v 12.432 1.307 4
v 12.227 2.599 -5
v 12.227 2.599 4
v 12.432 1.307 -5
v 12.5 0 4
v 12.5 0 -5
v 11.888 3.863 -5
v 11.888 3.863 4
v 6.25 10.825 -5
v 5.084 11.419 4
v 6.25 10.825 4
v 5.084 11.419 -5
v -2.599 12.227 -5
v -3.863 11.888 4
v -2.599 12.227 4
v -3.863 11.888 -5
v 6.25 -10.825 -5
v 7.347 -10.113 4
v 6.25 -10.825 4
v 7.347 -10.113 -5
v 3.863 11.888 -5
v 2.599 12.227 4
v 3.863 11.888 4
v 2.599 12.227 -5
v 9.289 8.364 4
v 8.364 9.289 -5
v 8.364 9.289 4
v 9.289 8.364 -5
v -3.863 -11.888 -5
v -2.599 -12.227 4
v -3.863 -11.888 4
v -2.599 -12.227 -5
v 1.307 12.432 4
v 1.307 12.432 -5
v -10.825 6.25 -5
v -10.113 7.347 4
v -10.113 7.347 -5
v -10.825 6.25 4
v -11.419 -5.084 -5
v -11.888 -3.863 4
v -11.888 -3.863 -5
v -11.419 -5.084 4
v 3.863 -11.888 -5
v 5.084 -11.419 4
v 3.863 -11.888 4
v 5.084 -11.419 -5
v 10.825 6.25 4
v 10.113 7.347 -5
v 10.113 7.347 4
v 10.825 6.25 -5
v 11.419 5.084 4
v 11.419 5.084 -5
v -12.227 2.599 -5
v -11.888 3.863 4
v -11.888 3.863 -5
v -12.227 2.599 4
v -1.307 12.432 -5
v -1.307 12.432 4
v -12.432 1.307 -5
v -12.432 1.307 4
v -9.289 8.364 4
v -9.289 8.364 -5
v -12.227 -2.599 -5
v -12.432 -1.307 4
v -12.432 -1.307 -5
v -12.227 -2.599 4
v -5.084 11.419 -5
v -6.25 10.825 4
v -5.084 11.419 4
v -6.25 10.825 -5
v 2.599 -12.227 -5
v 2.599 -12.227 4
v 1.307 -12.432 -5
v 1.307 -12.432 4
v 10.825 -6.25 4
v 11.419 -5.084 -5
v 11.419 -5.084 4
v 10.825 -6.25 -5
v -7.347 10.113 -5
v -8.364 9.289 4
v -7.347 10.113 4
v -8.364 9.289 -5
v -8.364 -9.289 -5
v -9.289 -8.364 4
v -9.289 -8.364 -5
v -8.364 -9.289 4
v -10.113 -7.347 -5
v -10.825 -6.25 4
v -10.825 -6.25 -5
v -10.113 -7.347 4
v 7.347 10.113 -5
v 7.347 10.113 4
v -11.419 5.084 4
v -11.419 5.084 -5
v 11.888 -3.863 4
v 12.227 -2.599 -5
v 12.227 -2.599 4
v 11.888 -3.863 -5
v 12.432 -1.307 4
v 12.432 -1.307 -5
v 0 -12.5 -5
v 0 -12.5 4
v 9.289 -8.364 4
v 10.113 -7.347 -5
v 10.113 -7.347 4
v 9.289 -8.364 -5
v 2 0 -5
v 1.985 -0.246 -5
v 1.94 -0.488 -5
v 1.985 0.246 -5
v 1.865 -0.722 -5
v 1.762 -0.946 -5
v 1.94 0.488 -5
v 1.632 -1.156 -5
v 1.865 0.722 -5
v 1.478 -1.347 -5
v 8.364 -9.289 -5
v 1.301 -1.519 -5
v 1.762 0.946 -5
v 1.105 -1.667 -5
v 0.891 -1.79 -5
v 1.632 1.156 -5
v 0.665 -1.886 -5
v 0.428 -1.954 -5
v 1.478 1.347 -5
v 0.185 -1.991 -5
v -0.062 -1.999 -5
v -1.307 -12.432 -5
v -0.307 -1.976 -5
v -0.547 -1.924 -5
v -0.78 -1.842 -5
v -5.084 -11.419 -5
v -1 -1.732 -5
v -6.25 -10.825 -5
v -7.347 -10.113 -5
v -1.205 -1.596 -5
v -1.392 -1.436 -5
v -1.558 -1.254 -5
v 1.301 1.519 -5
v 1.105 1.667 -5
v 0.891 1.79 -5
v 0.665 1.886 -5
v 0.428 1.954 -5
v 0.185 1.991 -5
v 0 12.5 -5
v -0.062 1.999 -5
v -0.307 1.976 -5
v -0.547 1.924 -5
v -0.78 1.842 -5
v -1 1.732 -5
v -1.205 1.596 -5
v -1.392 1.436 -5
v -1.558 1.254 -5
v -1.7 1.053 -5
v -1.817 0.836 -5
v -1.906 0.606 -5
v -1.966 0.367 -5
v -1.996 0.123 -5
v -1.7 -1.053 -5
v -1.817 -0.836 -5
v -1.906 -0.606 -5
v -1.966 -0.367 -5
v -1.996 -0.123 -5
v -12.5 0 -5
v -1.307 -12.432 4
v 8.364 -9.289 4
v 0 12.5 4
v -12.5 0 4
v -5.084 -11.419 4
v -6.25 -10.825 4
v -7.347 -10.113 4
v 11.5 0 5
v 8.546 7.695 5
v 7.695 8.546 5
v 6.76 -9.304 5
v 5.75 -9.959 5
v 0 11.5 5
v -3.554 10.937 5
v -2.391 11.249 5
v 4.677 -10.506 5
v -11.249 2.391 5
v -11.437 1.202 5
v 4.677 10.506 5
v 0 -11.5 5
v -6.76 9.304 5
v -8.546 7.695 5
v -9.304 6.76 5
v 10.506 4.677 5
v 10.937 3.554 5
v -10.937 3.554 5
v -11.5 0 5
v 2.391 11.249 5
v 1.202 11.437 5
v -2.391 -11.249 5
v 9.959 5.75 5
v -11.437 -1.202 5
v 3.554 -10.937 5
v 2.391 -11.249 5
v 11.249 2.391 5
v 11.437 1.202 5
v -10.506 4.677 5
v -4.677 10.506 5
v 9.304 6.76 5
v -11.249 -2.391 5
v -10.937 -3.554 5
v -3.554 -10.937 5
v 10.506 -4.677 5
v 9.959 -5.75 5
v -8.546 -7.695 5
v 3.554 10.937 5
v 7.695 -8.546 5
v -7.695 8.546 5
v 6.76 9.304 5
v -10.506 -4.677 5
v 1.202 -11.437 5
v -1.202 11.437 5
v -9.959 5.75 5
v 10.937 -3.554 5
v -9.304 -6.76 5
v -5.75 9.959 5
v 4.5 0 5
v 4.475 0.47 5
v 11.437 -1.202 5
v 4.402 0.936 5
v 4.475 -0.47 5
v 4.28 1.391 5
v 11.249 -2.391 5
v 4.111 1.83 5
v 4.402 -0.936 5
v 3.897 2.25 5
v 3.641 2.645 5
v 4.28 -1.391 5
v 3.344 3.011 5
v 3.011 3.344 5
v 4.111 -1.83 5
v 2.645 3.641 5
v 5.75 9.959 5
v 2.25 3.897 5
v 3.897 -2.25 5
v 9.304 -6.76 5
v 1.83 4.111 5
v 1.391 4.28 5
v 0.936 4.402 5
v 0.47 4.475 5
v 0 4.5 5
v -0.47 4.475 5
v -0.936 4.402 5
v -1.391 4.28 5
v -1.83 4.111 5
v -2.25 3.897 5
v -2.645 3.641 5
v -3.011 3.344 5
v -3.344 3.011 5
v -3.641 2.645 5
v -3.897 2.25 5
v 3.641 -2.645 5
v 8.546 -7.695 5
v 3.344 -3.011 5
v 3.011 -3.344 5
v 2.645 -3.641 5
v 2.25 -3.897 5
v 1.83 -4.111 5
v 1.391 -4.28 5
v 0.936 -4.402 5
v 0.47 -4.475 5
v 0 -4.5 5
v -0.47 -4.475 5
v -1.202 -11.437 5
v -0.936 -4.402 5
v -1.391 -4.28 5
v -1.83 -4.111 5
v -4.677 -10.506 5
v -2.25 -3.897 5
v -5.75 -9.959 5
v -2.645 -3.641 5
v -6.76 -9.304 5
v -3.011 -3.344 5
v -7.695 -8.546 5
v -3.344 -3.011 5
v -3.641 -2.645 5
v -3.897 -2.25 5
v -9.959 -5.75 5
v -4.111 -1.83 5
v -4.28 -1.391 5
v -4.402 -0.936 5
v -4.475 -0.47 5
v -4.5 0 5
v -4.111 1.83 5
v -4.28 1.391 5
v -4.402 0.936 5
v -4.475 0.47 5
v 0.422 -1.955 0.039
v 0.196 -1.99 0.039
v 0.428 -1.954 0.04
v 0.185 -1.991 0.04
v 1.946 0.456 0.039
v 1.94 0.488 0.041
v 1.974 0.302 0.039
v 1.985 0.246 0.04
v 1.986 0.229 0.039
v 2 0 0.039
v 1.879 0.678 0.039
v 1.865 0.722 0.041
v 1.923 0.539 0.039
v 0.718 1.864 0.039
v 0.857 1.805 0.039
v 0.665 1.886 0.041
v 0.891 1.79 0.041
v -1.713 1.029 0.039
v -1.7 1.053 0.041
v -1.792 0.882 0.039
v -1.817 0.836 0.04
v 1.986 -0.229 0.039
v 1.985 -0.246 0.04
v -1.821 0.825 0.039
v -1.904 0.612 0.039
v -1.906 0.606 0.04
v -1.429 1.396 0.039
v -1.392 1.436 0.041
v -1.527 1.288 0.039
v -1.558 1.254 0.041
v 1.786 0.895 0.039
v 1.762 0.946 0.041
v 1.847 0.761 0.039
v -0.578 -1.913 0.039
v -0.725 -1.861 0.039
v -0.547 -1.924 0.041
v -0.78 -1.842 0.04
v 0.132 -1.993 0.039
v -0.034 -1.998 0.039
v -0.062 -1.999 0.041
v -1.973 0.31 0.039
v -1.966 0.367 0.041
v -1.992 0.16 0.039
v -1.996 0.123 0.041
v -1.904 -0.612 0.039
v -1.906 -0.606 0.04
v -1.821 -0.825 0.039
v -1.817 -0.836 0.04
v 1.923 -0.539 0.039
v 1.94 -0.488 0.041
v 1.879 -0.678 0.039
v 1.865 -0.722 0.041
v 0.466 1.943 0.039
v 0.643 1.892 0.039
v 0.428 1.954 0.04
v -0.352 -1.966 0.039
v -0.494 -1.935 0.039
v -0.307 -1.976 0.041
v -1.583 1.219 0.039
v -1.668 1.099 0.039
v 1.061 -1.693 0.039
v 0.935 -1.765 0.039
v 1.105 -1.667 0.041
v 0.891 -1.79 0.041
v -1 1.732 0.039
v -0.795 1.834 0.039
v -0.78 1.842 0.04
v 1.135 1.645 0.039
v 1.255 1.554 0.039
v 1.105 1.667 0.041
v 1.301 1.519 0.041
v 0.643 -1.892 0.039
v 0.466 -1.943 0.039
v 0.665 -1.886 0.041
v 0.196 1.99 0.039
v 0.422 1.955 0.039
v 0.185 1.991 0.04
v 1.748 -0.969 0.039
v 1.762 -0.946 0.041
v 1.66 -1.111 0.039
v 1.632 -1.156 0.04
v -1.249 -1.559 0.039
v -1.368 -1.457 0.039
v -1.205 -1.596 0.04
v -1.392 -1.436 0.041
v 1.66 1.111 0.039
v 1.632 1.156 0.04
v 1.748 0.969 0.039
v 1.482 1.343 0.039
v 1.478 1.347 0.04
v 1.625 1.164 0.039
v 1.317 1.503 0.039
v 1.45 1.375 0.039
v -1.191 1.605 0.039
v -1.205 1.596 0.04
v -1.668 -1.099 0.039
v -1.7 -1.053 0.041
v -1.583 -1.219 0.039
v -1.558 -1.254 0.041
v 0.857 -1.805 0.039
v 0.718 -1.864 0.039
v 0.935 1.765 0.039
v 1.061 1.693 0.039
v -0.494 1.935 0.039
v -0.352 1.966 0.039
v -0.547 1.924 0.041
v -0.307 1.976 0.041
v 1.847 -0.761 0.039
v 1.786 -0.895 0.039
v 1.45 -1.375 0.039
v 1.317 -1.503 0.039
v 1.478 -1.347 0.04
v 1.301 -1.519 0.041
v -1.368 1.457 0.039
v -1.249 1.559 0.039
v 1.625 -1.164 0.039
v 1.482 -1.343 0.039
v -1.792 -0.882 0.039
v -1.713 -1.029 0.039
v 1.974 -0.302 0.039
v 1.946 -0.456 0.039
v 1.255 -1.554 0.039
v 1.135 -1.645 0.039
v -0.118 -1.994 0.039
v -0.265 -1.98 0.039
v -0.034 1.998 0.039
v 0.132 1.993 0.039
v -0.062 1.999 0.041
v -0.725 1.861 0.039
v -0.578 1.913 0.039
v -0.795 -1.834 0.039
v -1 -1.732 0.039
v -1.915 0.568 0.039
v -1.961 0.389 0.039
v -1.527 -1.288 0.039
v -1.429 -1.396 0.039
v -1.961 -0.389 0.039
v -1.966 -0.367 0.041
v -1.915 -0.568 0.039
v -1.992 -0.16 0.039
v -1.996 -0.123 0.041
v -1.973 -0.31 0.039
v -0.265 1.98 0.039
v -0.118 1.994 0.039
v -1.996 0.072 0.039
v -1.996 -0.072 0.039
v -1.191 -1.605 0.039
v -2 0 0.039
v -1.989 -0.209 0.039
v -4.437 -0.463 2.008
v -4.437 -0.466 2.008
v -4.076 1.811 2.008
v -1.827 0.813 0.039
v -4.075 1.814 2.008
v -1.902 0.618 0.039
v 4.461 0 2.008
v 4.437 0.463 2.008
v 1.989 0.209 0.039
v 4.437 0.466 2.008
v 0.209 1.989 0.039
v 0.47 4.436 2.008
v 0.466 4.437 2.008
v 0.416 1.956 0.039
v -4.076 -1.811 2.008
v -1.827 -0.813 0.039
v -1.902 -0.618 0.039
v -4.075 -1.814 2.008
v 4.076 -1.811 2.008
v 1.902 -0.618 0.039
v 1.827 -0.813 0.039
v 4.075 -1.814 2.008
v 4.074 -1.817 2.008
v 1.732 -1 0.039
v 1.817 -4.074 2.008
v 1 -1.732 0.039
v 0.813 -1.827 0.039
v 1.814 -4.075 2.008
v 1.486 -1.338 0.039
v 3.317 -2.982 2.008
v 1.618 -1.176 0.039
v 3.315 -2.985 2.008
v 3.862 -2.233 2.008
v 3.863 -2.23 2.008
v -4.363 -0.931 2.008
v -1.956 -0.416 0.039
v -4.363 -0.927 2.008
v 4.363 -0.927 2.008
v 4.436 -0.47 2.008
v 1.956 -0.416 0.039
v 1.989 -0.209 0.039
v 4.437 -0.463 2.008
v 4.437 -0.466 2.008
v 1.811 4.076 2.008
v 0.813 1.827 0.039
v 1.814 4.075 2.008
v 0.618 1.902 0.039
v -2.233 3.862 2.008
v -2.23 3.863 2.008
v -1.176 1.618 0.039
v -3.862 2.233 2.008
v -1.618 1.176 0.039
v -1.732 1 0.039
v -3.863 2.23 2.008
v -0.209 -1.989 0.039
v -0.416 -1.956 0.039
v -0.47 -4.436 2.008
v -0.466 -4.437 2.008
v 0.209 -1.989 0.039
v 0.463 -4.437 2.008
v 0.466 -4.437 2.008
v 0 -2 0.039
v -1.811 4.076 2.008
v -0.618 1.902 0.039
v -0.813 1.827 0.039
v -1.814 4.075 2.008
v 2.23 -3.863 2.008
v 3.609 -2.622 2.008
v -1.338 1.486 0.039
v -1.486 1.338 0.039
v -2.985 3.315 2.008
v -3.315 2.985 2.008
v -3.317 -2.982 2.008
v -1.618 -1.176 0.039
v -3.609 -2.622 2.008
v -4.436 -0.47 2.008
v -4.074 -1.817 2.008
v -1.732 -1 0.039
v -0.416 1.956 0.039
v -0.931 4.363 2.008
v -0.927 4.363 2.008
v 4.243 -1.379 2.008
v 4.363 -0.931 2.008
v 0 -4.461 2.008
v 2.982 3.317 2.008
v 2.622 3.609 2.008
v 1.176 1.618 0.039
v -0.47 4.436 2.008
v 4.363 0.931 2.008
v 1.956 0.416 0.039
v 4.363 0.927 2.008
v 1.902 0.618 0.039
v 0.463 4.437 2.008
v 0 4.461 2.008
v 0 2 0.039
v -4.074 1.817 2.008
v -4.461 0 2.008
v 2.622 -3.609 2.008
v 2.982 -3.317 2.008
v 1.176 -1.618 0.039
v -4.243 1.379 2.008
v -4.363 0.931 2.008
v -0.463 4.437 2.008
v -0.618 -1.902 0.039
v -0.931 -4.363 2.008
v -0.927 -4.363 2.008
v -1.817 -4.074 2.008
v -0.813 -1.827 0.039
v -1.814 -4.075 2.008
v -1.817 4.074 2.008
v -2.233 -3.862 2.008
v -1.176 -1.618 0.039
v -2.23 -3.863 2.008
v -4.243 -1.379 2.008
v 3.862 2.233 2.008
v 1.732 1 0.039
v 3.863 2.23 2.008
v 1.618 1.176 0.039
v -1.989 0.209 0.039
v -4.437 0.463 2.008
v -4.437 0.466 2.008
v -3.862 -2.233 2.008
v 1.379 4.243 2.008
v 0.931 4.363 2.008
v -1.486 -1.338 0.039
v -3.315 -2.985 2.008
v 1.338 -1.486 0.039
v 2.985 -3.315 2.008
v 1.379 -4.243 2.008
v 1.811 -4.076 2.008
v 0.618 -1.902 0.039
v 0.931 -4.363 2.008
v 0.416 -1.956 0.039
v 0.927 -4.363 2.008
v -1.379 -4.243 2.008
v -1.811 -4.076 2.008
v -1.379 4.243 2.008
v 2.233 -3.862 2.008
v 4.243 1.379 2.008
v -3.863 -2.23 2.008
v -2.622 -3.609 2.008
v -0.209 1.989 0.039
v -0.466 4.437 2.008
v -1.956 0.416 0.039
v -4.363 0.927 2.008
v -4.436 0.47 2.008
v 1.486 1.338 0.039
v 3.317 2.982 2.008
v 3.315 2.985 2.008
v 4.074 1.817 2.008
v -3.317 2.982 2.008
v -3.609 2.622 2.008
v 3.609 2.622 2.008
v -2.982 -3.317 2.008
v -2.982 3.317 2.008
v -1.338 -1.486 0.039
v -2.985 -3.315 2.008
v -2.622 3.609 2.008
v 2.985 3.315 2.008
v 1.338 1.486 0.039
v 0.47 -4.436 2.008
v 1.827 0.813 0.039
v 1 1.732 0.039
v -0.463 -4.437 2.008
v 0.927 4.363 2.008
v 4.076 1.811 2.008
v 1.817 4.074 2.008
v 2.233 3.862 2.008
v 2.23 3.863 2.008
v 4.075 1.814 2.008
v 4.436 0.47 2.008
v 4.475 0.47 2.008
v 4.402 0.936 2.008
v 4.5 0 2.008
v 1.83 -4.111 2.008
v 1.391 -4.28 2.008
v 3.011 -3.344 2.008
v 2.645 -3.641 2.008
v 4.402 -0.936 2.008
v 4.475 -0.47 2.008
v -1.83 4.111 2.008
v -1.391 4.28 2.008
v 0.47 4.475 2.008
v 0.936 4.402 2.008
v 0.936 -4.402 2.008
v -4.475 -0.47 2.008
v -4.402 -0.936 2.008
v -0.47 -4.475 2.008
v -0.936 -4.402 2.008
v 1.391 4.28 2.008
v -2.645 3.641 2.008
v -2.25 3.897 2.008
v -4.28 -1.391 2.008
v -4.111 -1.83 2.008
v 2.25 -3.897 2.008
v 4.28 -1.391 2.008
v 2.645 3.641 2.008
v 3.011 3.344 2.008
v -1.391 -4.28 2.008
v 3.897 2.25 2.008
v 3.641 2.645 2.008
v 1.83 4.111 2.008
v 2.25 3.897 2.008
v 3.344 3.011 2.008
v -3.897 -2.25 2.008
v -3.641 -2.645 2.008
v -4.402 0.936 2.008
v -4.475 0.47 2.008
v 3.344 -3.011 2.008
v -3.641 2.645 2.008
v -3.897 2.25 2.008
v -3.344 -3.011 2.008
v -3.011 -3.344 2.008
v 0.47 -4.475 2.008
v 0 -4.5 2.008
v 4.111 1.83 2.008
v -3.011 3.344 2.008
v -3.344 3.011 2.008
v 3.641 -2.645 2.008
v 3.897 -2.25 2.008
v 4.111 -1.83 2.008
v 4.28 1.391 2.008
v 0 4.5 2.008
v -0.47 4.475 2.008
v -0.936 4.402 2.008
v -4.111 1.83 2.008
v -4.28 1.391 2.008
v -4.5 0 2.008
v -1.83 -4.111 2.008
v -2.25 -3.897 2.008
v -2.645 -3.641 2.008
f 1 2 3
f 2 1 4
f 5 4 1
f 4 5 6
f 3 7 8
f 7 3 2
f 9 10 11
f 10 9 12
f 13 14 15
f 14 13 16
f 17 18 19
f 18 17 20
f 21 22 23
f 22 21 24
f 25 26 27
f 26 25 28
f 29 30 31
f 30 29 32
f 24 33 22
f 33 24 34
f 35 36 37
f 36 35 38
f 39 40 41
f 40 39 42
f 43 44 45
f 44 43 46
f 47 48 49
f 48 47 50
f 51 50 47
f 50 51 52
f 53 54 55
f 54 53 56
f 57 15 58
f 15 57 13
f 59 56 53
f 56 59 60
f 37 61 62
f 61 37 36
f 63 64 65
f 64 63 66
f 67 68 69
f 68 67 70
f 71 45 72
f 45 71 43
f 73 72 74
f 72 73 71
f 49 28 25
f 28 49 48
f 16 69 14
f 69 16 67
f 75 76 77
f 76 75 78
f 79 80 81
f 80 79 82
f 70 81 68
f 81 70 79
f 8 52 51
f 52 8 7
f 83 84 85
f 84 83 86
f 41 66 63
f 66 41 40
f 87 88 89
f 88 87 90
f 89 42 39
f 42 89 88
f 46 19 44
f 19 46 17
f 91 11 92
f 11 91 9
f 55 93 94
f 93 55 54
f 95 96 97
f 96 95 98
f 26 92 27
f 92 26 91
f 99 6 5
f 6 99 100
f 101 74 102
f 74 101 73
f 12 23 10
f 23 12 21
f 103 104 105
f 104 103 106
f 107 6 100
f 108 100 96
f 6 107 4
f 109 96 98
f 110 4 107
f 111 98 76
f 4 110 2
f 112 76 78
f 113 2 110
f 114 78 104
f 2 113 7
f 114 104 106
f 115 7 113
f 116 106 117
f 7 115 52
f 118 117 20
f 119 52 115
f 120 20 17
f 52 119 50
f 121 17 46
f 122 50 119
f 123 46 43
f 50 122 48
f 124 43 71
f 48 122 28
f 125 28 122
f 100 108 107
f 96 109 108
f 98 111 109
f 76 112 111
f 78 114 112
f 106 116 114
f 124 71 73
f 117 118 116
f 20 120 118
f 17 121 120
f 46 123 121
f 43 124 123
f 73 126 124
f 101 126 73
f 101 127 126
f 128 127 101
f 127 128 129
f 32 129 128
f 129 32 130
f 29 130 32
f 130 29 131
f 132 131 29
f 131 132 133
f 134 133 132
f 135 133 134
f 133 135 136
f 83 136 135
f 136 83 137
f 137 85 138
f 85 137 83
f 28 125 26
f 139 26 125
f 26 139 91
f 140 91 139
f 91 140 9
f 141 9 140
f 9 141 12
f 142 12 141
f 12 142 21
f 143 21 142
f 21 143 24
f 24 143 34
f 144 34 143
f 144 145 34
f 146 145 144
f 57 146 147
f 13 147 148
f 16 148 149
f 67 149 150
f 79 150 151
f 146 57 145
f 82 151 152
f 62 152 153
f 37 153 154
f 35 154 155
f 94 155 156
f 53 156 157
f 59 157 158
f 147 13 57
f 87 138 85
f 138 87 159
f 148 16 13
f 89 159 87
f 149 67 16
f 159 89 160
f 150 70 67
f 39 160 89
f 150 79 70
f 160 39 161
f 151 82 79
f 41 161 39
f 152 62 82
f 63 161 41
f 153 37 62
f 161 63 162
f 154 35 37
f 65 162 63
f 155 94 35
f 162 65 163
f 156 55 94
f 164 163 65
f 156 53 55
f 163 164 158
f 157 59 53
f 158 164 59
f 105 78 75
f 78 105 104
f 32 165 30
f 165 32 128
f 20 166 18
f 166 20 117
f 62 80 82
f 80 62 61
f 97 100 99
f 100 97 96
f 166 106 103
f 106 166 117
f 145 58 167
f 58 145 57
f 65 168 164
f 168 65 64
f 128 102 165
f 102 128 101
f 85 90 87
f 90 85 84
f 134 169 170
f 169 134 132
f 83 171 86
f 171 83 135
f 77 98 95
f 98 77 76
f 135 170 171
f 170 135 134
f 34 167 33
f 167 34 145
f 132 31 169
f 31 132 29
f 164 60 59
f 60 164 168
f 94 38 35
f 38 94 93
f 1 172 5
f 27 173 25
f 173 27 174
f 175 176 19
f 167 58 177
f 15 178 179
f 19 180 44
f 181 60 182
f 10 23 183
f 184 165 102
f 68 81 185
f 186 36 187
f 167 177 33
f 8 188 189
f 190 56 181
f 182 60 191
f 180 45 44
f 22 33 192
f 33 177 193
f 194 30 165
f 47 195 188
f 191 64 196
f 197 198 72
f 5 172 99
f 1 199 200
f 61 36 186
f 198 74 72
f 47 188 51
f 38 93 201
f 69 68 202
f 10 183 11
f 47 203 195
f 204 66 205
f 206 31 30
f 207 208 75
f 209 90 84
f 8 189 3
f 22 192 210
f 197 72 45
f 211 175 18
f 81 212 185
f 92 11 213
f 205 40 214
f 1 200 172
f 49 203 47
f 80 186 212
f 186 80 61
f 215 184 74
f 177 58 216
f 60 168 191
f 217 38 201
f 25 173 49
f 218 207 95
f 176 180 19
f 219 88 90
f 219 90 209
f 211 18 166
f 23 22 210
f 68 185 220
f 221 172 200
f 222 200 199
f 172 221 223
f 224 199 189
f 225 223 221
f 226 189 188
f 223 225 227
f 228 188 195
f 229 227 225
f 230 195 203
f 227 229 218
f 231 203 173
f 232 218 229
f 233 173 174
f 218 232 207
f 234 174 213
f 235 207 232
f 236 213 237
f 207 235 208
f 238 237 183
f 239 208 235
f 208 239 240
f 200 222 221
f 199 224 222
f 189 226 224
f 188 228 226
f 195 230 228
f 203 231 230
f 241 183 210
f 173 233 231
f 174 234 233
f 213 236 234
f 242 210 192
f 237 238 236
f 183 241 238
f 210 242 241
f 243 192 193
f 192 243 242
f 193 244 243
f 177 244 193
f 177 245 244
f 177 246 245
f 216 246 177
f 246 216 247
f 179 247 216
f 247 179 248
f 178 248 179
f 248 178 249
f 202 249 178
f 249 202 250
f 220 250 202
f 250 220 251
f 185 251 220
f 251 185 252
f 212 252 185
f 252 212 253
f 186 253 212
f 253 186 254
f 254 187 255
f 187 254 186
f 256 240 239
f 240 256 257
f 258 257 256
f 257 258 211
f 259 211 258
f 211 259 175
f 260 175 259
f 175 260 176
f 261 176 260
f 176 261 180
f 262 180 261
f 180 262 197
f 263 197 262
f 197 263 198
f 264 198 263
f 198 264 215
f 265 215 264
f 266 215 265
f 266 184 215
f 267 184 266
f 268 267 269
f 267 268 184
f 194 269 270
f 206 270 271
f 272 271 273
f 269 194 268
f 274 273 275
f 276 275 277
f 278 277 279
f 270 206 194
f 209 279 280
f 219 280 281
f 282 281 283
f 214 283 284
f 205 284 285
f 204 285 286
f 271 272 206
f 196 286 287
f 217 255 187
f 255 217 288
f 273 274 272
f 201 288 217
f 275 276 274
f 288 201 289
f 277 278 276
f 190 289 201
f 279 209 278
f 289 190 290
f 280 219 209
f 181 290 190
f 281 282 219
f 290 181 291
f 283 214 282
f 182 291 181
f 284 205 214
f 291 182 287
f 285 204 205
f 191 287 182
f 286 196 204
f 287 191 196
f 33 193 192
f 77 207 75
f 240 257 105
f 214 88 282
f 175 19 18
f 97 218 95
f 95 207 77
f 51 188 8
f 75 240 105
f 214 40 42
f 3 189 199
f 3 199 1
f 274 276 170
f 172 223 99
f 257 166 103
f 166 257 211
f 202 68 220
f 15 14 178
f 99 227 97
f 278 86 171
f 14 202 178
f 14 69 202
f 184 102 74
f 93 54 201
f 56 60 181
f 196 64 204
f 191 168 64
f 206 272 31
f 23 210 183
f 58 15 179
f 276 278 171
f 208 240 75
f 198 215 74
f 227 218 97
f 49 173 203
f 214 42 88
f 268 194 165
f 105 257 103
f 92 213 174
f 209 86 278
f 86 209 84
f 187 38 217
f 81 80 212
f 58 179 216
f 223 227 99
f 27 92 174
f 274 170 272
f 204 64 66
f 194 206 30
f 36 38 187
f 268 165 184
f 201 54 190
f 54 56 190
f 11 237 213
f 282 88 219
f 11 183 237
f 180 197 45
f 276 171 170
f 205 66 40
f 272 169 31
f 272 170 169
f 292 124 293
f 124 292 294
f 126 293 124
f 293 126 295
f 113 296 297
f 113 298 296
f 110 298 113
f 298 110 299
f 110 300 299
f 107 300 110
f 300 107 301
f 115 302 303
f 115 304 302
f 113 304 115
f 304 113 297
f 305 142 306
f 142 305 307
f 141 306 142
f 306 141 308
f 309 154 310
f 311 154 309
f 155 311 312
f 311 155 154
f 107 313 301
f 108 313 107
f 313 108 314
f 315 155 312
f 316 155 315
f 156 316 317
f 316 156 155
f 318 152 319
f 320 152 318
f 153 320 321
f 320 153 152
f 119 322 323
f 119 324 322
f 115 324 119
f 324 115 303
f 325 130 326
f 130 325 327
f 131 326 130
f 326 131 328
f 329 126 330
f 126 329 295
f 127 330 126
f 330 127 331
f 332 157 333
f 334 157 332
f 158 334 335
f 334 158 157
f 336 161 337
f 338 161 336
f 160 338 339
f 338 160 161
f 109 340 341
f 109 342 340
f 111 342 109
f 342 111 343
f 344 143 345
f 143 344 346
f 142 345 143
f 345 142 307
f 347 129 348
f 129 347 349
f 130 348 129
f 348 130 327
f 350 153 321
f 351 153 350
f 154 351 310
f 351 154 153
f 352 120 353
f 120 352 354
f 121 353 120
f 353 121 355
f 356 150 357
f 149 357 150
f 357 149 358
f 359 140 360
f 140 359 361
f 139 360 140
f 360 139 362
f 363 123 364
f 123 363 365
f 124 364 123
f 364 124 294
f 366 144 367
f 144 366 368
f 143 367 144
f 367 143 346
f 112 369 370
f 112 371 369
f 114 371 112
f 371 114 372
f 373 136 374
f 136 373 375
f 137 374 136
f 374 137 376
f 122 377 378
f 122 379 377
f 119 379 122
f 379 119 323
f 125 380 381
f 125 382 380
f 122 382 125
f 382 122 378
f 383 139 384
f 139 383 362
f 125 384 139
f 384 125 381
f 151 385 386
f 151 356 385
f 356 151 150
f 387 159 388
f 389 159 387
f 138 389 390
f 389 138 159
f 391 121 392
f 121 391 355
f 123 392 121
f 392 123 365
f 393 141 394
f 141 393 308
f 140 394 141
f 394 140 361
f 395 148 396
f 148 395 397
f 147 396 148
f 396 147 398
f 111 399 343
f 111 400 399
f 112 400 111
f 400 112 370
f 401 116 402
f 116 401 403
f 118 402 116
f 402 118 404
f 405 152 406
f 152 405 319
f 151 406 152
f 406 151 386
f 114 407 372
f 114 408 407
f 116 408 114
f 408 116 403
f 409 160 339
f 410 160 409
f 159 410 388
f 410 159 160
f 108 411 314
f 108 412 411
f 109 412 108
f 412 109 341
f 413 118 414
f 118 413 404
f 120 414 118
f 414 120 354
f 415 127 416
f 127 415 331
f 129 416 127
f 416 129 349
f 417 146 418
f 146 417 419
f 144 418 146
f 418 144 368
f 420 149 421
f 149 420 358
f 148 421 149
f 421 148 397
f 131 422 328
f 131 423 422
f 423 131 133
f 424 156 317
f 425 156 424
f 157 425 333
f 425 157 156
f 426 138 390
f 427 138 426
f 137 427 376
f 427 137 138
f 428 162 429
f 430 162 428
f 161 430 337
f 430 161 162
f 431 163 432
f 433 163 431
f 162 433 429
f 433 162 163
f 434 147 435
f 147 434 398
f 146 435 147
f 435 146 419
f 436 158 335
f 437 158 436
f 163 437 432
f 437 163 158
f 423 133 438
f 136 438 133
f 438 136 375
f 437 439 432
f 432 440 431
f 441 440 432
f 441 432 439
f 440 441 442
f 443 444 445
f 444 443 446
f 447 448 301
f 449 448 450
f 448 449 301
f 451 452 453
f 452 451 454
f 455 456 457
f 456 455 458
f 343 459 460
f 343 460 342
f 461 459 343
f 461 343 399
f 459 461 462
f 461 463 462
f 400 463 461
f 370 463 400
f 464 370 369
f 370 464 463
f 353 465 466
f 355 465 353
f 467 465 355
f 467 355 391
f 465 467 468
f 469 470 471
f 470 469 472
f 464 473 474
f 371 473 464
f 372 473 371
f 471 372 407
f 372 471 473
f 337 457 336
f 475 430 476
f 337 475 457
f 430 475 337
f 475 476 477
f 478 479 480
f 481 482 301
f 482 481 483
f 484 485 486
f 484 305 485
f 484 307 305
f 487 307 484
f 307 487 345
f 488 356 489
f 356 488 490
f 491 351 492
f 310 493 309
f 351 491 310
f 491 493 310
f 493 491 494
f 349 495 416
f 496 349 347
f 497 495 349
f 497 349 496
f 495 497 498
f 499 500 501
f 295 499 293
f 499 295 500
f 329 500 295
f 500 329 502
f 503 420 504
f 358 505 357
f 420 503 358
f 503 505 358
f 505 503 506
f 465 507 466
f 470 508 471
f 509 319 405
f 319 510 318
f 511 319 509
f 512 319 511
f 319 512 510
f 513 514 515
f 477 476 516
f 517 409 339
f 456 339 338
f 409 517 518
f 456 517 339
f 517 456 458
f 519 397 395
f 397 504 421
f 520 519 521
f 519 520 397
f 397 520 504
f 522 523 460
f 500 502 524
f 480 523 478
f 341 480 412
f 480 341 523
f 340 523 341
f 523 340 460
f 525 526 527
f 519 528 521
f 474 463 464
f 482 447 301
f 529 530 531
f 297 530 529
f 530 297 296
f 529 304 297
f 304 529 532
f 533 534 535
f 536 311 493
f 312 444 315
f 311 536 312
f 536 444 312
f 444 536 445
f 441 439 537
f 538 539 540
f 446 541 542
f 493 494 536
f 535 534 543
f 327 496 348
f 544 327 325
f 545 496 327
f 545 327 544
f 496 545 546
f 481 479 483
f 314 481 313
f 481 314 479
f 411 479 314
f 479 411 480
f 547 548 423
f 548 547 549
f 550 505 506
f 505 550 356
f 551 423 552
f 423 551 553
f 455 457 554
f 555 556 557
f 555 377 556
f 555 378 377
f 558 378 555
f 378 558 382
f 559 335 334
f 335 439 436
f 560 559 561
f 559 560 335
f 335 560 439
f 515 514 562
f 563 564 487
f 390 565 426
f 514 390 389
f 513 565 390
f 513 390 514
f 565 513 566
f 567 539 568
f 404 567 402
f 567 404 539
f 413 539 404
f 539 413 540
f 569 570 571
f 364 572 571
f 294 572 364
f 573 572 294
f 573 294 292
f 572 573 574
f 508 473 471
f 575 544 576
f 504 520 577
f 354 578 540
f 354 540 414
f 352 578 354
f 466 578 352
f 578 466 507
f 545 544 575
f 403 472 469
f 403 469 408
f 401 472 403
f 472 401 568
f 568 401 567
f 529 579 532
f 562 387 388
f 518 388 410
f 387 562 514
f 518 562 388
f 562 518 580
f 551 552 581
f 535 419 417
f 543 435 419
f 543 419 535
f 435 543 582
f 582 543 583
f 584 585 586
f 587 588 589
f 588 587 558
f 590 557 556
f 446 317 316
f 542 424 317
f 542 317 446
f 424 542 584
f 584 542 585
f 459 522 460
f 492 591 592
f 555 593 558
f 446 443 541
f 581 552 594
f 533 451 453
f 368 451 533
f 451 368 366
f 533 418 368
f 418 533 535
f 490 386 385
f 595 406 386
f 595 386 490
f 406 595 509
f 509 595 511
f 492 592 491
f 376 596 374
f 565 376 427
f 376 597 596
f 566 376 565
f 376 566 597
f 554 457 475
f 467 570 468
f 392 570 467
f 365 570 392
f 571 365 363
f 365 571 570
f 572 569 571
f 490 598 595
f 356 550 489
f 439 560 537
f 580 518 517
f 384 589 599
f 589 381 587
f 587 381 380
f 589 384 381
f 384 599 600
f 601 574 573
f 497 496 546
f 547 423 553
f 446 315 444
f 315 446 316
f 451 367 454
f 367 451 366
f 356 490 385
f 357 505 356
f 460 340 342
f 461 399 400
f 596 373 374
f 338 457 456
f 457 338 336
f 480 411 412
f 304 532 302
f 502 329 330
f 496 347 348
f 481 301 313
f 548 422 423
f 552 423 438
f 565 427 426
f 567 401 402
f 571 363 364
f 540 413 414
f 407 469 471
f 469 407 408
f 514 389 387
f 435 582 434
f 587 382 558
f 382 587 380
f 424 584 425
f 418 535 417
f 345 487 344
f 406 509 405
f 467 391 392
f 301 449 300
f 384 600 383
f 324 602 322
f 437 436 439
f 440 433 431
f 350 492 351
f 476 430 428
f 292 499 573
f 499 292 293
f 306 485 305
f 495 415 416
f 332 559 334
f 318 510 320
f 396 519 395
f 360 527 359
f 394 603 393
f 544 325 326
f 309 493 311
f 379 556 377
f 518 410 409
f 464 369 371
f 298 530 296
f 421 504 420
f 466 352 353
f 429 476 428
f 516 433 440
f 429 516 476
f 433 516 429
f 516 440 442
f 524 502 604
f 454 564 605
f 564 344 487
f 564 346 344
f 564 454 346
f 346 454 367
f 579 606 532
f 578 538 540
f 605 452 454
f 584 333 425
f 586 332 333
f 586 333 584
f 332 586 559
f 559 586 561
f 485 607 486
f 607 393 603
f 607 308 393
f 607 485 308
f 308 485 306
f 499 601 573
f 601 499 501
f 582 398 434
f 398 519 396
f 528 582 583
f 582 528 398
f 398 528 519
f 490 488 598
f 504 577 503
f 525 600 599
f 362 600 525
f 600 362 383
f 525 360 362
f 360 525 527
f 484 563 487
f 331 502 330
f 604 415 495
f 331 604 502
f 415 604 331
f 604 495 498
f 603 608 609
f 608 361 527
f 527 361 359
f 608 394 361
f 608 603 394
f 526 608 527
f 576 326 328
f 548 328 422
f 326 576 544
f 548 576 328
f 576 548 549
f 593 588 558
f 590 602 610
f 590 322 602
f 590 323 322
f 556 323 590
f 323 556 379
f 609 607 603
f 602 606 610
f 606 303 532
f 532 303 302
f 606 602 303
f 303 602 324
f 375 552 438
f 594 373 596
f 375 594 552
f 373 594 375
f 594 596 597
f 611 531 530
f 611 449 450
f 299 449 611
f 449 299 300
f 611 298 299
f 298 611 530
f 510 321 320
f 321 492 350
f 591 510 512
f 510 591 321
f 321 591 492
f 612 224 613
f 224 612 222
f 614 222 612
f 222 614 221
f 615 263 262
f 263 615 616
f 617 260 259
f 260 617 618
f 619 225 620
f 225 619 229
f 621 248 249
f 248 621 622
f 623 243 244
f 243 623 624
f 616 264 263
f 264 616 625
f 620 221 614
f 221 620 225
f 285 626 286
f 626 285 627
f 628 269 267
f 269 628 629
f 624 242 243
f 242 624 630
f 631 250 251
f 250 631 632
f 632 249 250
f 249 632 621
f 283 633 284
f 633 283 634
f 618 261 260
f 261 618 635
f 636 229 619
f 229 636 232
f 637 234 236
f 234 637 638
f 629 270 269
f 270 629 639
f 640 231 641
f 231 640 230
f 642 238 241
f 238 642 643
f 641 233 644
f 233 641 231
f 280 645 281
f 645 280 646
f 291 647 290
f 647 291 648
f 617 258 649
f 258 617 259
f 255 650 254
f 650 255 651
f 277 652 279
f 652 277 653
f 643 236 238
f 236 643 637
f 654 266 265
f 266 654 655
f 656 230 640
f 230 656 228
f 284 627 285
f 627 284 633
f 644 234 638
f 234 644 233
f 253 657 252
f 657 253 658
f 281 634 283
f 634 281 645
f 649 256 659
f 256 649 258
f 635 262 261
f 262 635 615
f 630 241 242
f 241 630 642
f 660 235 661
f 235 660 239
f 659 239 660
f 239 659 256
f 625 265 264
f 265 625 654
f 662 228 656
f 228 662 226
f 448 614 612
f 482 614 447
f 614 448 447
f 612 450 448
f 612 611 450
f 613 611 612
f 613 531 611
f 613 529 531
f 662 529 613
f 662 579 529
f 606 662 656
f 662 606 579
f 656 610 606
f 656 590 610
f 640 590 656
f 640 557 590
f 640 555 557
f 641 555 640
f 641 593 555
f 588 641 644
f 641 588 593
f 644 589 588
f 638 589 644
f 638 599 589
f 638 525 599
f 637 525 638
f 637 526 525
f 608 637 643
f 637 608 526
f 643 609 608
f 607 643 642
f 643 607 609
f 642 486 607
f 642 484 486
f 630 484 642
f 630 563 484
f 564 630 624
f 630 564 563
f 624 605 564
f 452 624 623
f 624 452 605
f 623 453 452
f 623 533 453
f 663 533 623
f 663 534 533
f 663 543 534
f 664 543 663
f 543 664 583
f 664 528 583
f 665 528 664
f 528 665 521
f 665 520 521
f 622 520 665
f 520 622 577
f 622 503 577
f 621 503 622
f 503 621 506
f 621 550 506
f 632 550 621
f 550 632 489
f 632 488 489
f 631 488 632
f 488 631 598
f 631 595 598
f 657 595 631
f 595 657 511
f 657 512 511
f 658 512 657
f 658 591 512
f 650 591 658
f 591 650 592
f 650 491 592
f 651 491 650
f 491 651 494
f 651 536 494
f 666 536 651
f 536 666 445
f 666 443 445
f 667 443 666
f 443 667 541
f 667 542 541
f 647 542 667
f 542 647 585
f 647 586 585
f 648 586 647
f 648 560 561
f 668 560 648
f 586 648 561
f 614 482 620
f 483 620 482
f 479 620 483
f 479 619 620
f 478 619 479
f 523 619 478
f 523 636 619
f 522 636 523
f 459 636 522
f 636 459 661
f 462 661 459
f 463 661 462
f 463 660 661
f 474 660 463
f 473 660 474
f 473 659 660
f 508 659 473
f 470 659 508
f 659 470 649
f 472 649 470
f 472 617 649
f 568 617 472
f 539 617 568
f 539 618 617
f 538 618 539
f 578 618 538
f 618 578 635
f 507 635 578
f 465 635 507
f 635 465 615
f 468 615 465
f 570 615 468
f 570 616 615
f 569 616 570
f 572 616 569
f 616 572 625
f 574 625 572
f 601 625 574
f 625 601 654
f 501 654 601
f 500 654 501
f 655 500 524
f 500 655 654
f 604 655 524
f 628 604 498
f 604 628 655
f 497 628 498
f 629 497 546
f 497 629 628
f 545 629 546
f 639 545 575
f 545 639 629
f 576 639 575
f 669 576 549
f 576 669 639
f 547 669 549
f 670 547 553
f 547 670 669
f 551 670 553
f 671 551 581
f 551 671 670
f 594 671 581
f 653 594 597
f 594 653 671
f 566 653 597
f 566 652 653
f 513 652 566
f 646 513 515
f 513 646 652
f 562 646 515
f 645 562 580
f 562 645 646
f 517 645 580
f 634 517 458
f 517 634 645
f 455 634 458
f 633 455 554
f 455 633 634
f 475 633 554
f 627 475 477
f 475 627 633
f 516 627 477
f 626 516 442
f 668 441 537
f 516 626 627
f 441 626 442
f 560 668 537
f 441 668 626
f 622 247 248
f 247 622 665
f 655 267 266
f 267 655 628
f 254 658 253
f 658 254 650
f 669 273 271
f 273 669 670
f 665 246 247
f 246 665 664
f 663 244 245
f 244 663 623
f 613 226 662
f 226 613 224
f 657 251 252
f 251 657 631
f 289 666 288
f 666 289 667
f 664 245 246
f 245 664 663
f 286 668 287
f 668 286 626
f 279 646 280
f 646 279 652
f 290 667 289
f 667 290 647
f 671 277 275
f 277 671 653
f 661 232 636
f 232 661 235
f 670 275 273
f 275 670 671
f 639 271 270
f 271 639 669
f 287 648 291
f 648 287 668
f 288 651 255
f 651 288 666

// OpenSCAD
// file: ../../globals.scad
//$fa = $preview? 12 : 6;
//$fs = $preview? 2 : 0.2;

EPS = 1/64;

// Used for indexing coordinates since the dot syntax is not
// officialy supported
X = 0;
Y = 1;
Z = 2;

// Slicer defaults
LAYER_HEIGHT = 0.2;
EXTRUSION_WIDTH = 0.5;

// Defaults for all parts
WALL_XS = 1;
WALL_S = 2;
WALL = 3;
WALL_L = 5;
WALL_XL = 7.5;

// Seems to be a good middle ground, corresponds to #8 for imperial ones
SCREW = 4;

// Set up OpenSCAD rendering defaults
$fa = 6;
$fs = EXTRUSION_WIDTH / 2;

function default(v, d) = is_undef(v)? d : v;

// For engraving in all planes except those parrallel to XY.
module v_engrave(t, size=10) {
    translate([0, 0.3, 0])
    rotate([90,0,0])
    linear_extrude(0.3 + EPS)
    text(t, size=size, font="DejaVu Sans:style=Book", valign="center", halign="center", $fn=8);
}

// For engraving in all planes parrallel to XY.
module h_engrave(t, size=10) {
    translate([0, 0, -0.7])
    linear_extrude(0.7 + EPS)
    text(t, size=size, font="DejaVu Sans:style=Book", valign="center", halign="center", $fn=8);
}

// Used for creating screw holes
module screw(height, head_extra_height=0) {
    translate([0,0, -(height + head_extra_height) / 2]) {
        cylinder(height + 2*EPS, r=SCREW/2);
        
        // Add some extra radius to account for hole shrinkage
        translate([0,0,height-SCREW/2 + 2*EPS])
        cylinder(SCREW/2, r1=SCREW/2, r2=SCREW + 0.5);
        
        translate([0,0,height])
        cylinder(head_extra_height + EPS, r=SCREW + 0.5);
    }
}
// main file
include <../../globals.scad>;
use <../../dim.scad>;

//D: Diameter
DIAMETER = 25;

//H: Height
HEIGHT = 10; // [4:50]

module circular_foot(height, diameter) {
    chamfer = 1;
    
    difference() {
        union() {
            translate([0,0, -chamfer/2])
            cylinder(height - chamfer, r=diameter/2, center=true);
            
            translate([0,0, height/2 - chamfer])
            cylinder(chamfer, r1=diameter/2, r2=diameter/2 - chamfer);
        }
        
        translate([0,0, SCREW/2])
        screw(height + EPS, height);
    }
    
    translate([-diameter/2,0])
    dim_z(height);
    
    translate([0,0,-height/2])
    dim_xy_diameter(diameter, center_mark=false);
}

circular_foot(HEIGHT, DIAMETER);
